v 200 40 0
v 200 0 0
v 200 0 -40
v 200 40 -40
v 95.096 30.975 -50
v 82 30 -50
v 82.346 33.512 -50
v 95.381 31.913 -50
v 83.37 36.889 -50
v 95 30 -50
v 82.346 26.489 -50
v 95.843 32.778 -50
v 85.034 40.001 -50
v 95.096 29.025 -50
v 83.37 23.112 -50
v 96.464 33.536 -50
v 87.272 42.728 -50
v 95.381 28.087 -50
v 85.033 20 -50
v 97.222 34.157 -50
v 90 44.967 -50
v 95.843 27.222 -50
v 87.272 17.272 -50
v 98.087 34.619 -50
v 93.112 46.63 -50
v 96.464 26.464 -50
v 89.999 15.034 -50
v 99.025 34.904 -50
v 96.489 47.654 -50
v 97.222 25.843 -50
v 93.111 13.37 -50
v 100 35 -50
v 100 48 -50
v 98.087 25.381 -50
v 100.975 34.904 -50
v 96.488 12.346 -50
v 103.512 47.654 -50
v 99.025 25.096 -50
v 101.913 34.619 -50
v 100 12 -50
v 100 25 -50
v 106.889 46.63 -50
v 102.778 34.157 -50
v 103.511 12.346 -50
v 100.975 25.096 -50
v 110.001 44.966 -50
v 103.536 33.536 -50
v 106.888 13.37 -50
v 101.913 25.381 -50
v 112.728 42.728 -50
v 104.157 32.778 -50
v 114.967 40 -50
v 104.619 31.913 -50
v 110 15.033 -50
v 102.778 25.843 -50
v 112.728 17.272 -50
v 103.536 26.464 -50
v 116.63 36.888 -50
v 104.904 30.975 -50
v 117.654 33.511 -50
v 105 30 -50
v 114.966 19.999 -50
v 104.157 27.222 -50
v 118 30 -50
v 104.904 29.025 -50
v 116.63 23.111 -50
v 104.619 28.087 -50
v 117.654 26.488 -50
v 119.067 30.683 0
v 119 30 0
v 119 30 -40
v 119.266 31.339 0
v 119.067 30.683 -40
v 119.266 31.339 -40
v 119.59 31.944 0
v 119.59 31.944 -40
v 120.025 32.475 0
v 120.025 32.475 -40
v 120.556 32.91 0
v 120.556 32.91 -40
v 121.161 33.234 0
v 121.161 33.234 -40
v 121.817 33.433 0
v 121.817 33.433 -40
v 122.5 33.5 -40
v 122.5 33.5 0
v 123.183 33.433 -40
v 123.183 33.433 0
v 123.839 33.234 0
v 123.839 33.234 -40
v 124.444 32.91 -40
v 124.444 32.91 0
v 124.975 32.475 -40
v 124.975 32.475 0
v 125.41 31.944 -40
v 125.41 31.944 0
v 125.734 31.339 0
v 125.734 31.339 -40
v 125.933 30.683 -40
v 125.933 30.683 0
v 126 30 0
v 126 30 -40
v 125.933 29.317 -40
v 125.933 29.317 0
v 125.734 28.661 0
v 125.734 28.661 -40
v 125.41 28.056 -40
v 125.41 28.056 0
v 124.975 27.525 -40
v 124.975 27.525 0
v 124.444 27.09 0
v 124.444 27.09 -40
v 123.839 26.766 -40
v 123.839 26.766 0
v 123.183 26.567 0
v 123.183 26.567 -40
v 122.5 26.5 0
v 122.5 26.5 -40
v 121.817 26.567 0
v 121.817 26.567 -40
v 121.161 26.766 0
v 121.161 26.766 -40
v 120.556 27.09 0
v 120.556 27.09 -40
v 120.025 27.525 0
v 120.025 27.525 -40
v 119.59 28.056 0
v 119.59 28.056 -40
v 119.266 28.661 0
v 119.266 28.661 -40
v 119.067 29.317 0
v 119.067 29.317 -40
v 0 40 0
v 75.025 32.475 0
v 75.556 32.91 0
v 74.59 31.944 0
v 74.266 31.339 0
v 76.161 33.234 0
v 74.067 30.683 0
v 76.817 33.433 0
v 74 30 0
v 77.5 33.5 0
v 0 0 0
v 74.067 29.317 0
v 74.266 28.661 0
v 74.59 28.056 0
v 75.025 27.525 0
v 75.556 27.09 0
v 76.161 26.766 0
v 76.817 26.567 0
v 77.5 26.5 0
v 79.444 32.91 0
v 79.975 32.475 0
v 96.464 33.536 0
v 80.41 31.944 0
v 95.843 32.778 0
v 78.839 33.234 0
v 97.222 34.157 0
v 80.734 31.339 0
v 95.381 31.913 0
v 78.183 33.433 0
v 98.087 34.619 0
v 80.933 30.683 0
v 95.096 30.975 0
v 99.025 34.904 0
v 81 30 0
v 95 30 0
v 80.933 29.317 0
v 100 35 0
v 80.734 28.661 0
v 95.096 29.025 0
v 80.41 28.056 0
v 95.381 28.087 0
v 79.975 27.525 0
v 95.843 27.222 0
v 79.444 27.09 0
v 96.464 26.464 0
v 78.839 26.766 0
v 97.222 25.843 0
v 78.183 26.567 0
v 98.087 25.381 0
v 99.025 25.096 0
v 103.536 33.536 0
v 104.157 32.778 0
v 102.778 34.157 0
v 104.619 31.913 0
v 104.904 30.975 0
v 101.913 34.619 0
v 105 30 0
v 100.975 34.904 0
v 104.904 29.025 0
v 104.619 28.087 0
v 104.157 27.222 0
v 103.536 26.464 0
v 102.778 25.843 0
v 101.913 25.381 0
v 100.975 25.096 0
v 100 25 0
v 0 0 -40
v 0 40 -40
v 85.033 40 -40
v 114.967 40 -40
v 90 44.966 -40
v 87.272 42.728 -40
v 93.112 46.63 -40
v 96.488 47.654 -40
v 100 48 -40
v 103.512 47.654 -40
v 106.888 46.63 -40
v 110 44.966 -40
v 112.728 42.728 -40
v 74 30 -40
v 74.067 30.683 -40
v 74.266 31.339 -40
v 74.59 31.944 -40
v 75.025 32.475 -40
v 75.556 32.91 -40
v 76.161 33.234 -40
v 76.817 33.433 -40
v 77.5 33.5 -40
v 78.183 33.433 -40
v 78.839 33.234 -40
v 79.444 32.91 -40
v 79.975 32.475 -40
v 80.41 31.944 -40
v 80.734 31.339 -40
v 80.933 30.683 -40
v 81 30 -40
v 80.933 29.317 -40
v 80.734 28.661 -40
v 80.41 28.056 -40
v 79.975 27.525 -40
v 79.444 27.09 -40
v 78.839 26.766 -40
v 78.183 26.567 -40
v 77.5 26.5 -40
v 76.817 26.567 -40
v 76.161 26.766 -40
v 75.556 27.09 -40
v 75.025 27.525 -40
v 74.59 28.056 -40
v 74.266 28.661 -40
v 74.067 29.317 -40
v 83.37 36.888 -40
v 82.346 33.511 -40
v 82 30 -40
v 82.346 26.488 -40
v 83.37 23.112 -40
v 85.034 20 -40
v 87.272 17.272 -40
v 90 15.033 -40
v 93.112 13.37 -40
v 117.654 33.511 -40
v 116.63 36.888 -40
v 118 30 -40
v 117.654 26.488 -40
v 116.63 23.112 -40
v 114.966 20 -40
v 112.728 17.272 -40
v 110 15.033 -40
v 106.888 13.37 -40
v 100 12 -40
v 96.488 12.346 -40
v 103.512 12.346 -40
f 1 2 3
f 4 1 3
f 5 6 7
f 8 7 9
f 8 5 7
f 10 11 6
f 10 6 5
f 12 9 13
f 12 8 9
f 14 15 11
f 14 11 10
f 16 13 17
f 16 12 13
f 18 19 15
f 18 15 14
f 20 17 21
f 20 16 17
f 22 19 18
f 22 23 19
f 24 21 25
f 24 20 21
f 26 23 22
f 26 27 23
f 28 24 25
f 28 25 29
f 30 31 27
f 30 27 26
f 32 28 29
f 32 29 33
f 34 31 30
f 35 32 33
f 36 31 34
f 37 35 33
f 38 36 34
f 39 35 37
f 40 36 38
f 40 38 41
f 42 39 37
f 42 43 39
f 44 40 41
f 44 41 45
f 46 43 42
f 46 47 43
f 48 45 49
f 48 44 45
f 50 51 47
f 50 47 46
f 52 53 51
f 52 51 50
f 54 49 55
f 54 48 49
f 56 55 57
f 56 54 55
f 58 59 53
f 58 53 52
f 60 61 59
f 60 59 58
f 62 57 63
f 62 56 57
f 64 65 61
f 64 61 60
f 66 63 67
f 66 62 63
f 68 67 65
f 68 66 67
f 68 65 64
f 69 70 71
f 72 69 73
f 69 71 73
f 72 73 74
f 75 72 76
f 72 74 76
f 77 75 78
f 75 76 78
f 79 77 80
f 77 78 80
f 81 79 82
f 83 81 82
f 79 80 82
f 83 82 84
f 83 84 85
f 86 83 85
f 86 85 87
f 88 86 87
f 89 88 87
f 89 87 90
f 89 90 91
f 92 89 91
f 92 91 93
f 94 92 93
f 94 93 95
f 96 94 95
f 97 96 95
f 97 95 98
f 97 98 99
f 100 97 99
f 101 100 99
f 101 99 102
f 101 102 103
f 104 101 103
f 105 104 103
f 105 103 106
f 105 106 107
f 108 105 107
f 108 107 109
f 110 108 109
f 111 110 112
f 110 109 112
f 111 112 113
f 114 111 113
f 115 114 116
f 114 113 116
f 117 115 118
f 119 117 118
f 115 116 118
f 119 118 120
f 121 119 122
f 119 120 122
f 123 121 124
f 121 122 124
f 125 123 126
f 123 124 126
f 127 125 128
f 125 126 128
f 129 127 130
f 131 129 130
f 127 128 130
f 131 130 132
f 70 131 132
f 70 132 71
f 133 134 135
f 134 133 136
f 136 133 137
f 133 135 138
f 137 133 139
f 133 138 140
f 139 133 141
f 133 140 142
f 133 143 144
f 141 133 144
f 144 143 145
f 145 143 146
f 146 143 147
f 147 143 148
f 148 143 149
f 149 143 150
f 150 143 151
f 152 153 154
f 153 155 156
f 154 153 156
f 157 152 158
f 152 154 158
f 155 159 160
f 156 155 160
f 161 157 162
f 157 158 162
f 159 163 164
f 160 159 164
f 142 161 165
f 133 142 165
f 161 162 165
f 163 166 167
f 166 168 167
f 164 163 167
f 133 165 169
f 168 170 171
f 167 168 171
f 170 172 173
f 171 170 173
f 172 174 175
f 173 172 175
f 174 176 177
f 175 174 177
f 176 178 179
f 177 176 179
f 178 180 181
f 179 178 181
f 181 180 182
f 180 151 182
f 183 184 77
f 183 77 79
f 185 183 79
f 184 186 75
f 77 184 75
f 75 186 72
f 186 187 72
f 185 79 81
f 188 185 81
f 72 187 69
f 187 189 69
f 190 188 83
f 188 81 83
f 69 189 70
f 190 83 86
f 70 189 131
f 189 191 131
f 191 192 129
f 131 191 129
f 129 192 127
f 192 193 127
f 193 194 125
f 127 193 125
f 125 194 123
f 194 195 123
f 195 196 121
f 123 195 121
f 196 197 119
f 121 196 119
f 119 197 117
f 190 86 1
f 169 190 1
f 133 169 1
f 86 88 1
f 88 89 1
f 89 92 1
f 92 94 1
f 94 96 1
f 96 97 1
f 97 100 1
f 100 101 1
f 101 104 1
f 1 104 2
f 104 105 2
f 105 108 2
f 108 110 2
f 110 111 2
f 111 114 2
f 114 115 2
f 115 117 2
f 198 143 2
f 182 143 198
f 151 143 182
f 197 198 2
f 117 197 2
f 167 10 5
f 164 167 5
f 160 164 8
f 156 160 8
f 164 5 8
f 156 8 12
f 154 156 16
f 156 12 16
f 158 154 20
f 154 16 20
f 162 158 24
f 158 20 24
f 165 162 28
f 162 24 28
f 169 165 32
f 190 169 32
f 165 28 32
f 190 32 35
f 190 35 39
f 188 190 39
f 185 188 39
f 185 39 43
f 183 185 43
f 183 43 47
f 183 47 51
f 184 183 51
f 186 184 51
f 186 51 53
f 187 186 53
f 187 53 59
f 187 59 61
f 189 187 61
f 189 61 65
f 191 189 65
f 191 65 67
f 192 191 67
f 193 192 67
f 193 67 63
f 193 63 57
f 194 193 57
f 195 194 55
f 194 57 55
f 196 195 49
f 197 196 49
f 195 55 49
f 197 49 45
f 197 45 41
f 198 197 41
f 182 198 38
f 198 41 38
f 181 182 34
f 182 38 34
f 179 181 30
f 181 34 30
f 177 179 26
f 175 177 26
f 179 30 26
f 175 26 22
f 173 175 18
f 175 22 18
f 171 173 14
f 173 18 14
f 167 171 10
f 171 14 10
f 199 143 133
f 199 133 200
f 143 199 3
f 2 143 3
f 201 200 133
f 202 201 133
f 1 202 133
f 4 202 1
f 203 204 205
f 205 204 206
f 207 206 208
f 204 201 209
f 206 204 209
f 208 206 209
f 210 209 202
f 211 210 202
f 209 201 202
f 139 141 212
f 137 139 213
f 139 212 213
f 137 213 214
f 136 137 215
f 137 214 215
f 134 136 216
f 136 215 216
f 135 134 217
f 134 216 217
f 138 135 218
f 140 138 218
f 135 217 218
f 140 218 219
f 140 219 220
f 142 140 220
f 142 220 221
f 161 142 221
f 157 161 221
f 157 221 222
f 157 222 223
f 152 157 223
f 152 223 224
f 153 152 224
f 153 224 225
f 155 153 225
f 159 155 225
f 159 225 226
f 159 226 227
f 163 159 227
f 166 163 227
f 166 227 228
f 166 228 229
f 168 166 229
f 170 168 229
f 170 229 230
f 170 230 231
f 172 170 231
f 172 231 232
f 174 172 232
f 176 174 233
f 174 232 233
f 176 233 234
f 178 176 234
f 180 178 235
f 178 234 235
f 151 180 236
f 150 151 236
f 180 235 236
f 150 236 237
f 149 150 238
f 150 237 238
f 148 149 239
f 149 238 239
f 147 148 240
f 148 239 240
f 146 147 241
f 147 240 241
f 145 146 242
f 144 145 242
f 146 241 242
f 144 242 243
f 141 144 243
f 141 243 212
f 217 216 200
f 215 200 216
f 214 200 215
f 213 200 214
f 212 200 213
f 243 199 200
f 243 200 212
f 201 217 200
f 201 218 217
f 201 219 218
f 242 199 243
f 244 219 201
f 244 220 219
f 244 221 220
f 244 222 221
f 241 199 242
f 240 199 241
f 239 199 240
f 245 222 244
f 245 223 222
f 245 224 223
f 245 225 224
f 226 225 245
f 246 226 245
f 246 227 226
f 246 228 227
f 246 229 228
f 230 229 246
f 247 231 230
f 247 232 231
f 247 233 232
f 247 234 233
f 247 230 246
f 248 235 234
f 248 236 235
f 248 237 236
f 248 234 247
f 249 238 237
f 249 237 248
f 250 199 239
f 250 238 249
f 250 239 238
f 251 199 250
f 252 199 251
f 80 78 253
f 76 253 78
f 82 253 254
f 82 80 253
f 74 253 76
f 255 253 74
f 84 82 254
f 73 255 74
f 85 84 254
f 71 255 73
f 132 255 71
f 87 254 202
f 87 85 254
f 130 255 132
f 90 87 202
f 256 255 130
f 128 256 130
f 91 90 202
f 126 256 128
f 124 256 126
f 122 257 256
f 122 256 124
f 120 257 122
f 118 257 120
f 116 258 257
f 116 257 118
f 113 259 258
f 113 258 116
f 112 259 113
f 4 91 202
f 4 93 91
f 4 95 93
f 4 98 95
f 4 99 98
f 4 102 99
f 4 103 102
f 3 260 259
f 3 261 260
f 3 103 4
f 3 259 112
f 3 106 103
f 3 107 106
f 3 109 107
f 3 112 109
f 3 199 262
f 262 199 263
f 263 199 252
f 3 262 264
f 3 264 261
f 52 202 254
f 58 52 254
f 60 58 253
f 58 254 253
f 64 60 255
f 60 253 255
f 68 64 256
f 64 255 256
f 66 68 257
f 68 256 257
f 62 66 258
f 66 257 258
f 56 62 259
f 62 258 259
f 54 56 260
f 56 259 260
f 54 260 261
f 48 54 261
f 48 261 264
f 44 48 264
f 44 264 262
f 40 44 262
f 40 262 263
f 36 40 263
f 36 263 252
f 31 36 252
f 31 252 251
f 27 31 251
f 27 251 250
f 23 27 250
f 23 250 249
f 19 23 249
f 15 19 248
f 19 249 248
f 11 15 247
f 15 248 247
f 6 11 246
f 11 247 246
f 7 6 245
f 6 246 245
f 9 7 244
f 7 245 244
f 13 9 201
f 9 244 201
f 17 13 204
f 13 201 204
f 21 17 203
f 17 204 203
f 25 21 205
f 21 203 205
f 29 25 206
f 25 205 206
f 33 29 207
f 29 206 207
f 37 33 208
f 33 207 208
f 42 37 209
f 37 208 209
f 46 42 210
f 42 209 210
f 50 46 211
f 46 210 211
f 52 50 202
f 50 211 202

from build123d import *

# Parameters (mm, degrees)
SKETCH2_W           = 200
SKETCH2_H           = 40
BOSS_EXTRUDE1_DEPTH = 40
SKETCH3_R           = 18
BOSS_EXTRUDE2_DEPTH = 10
SKETCH4_R           = 5
CUT_EXTRUDE1_DEPTH  = 51
SKETCH5_R           = 3.5
CUT_EXTRUDE2_DEPTH  = 51


with BuildPart() as part:
    # Sketch2 → Boss-Extrude1 (new body)
    with BuildSketch(Plane(origin=(0, 0, 0), x_dir=(1, 0, 0), z_dir=(0, 1, 0))):
        with Locations((100, 20)):
            Rectangle(SKETCH2_W, SKETCH2_H)
    extrude(amount=BOSS_EXTRUDE1_DEPTH)

    # Sketch3 → Boss-Extrude2 (add)
    with BuildSketch(Plane(origin=(0, 0, -40), x_dir=(-1, 0, 0), z_dir=(0, 0, -1))):
        with Locations(Location((-100, 30, 0), (0, 0, 146.251011404))):
            Circle(SKETCH3_R)
    extrude(amount=BOSS_EXTRUDE2_DEPTH)

    # Sketch4 → Cut-Extrude1 (cut)
    with BuildSketch(Plane(origin=(0, 0, -50), x_dir=(-1, 0, 0), z_dir=(0, 0, -1))):
        with Locations((-100, 30)):
            Circle(SKETCH4_R)
    extrude(amount=-CUT_EXTRUDE1_DEPTH, mode=Mode.SUBTRACT)

    # Sketch5 → Cut-Extrude2 (cut)
    with BuildSketch(Plane(origin=(0, 0, -50), x_dir=(-1, 0, 0), z_dir=(0, 0, -1))):
        with Locations((-77.5, 30)):
            Circle(SKETCH5_R)
        with Locations((-122.5, 30)):
            Circle(SKETCH5_R)
    extrude(amount=-CUT_EXTRUDE2_DEPTH, mode=Mode.SUBTRACT)


solid = part.part
